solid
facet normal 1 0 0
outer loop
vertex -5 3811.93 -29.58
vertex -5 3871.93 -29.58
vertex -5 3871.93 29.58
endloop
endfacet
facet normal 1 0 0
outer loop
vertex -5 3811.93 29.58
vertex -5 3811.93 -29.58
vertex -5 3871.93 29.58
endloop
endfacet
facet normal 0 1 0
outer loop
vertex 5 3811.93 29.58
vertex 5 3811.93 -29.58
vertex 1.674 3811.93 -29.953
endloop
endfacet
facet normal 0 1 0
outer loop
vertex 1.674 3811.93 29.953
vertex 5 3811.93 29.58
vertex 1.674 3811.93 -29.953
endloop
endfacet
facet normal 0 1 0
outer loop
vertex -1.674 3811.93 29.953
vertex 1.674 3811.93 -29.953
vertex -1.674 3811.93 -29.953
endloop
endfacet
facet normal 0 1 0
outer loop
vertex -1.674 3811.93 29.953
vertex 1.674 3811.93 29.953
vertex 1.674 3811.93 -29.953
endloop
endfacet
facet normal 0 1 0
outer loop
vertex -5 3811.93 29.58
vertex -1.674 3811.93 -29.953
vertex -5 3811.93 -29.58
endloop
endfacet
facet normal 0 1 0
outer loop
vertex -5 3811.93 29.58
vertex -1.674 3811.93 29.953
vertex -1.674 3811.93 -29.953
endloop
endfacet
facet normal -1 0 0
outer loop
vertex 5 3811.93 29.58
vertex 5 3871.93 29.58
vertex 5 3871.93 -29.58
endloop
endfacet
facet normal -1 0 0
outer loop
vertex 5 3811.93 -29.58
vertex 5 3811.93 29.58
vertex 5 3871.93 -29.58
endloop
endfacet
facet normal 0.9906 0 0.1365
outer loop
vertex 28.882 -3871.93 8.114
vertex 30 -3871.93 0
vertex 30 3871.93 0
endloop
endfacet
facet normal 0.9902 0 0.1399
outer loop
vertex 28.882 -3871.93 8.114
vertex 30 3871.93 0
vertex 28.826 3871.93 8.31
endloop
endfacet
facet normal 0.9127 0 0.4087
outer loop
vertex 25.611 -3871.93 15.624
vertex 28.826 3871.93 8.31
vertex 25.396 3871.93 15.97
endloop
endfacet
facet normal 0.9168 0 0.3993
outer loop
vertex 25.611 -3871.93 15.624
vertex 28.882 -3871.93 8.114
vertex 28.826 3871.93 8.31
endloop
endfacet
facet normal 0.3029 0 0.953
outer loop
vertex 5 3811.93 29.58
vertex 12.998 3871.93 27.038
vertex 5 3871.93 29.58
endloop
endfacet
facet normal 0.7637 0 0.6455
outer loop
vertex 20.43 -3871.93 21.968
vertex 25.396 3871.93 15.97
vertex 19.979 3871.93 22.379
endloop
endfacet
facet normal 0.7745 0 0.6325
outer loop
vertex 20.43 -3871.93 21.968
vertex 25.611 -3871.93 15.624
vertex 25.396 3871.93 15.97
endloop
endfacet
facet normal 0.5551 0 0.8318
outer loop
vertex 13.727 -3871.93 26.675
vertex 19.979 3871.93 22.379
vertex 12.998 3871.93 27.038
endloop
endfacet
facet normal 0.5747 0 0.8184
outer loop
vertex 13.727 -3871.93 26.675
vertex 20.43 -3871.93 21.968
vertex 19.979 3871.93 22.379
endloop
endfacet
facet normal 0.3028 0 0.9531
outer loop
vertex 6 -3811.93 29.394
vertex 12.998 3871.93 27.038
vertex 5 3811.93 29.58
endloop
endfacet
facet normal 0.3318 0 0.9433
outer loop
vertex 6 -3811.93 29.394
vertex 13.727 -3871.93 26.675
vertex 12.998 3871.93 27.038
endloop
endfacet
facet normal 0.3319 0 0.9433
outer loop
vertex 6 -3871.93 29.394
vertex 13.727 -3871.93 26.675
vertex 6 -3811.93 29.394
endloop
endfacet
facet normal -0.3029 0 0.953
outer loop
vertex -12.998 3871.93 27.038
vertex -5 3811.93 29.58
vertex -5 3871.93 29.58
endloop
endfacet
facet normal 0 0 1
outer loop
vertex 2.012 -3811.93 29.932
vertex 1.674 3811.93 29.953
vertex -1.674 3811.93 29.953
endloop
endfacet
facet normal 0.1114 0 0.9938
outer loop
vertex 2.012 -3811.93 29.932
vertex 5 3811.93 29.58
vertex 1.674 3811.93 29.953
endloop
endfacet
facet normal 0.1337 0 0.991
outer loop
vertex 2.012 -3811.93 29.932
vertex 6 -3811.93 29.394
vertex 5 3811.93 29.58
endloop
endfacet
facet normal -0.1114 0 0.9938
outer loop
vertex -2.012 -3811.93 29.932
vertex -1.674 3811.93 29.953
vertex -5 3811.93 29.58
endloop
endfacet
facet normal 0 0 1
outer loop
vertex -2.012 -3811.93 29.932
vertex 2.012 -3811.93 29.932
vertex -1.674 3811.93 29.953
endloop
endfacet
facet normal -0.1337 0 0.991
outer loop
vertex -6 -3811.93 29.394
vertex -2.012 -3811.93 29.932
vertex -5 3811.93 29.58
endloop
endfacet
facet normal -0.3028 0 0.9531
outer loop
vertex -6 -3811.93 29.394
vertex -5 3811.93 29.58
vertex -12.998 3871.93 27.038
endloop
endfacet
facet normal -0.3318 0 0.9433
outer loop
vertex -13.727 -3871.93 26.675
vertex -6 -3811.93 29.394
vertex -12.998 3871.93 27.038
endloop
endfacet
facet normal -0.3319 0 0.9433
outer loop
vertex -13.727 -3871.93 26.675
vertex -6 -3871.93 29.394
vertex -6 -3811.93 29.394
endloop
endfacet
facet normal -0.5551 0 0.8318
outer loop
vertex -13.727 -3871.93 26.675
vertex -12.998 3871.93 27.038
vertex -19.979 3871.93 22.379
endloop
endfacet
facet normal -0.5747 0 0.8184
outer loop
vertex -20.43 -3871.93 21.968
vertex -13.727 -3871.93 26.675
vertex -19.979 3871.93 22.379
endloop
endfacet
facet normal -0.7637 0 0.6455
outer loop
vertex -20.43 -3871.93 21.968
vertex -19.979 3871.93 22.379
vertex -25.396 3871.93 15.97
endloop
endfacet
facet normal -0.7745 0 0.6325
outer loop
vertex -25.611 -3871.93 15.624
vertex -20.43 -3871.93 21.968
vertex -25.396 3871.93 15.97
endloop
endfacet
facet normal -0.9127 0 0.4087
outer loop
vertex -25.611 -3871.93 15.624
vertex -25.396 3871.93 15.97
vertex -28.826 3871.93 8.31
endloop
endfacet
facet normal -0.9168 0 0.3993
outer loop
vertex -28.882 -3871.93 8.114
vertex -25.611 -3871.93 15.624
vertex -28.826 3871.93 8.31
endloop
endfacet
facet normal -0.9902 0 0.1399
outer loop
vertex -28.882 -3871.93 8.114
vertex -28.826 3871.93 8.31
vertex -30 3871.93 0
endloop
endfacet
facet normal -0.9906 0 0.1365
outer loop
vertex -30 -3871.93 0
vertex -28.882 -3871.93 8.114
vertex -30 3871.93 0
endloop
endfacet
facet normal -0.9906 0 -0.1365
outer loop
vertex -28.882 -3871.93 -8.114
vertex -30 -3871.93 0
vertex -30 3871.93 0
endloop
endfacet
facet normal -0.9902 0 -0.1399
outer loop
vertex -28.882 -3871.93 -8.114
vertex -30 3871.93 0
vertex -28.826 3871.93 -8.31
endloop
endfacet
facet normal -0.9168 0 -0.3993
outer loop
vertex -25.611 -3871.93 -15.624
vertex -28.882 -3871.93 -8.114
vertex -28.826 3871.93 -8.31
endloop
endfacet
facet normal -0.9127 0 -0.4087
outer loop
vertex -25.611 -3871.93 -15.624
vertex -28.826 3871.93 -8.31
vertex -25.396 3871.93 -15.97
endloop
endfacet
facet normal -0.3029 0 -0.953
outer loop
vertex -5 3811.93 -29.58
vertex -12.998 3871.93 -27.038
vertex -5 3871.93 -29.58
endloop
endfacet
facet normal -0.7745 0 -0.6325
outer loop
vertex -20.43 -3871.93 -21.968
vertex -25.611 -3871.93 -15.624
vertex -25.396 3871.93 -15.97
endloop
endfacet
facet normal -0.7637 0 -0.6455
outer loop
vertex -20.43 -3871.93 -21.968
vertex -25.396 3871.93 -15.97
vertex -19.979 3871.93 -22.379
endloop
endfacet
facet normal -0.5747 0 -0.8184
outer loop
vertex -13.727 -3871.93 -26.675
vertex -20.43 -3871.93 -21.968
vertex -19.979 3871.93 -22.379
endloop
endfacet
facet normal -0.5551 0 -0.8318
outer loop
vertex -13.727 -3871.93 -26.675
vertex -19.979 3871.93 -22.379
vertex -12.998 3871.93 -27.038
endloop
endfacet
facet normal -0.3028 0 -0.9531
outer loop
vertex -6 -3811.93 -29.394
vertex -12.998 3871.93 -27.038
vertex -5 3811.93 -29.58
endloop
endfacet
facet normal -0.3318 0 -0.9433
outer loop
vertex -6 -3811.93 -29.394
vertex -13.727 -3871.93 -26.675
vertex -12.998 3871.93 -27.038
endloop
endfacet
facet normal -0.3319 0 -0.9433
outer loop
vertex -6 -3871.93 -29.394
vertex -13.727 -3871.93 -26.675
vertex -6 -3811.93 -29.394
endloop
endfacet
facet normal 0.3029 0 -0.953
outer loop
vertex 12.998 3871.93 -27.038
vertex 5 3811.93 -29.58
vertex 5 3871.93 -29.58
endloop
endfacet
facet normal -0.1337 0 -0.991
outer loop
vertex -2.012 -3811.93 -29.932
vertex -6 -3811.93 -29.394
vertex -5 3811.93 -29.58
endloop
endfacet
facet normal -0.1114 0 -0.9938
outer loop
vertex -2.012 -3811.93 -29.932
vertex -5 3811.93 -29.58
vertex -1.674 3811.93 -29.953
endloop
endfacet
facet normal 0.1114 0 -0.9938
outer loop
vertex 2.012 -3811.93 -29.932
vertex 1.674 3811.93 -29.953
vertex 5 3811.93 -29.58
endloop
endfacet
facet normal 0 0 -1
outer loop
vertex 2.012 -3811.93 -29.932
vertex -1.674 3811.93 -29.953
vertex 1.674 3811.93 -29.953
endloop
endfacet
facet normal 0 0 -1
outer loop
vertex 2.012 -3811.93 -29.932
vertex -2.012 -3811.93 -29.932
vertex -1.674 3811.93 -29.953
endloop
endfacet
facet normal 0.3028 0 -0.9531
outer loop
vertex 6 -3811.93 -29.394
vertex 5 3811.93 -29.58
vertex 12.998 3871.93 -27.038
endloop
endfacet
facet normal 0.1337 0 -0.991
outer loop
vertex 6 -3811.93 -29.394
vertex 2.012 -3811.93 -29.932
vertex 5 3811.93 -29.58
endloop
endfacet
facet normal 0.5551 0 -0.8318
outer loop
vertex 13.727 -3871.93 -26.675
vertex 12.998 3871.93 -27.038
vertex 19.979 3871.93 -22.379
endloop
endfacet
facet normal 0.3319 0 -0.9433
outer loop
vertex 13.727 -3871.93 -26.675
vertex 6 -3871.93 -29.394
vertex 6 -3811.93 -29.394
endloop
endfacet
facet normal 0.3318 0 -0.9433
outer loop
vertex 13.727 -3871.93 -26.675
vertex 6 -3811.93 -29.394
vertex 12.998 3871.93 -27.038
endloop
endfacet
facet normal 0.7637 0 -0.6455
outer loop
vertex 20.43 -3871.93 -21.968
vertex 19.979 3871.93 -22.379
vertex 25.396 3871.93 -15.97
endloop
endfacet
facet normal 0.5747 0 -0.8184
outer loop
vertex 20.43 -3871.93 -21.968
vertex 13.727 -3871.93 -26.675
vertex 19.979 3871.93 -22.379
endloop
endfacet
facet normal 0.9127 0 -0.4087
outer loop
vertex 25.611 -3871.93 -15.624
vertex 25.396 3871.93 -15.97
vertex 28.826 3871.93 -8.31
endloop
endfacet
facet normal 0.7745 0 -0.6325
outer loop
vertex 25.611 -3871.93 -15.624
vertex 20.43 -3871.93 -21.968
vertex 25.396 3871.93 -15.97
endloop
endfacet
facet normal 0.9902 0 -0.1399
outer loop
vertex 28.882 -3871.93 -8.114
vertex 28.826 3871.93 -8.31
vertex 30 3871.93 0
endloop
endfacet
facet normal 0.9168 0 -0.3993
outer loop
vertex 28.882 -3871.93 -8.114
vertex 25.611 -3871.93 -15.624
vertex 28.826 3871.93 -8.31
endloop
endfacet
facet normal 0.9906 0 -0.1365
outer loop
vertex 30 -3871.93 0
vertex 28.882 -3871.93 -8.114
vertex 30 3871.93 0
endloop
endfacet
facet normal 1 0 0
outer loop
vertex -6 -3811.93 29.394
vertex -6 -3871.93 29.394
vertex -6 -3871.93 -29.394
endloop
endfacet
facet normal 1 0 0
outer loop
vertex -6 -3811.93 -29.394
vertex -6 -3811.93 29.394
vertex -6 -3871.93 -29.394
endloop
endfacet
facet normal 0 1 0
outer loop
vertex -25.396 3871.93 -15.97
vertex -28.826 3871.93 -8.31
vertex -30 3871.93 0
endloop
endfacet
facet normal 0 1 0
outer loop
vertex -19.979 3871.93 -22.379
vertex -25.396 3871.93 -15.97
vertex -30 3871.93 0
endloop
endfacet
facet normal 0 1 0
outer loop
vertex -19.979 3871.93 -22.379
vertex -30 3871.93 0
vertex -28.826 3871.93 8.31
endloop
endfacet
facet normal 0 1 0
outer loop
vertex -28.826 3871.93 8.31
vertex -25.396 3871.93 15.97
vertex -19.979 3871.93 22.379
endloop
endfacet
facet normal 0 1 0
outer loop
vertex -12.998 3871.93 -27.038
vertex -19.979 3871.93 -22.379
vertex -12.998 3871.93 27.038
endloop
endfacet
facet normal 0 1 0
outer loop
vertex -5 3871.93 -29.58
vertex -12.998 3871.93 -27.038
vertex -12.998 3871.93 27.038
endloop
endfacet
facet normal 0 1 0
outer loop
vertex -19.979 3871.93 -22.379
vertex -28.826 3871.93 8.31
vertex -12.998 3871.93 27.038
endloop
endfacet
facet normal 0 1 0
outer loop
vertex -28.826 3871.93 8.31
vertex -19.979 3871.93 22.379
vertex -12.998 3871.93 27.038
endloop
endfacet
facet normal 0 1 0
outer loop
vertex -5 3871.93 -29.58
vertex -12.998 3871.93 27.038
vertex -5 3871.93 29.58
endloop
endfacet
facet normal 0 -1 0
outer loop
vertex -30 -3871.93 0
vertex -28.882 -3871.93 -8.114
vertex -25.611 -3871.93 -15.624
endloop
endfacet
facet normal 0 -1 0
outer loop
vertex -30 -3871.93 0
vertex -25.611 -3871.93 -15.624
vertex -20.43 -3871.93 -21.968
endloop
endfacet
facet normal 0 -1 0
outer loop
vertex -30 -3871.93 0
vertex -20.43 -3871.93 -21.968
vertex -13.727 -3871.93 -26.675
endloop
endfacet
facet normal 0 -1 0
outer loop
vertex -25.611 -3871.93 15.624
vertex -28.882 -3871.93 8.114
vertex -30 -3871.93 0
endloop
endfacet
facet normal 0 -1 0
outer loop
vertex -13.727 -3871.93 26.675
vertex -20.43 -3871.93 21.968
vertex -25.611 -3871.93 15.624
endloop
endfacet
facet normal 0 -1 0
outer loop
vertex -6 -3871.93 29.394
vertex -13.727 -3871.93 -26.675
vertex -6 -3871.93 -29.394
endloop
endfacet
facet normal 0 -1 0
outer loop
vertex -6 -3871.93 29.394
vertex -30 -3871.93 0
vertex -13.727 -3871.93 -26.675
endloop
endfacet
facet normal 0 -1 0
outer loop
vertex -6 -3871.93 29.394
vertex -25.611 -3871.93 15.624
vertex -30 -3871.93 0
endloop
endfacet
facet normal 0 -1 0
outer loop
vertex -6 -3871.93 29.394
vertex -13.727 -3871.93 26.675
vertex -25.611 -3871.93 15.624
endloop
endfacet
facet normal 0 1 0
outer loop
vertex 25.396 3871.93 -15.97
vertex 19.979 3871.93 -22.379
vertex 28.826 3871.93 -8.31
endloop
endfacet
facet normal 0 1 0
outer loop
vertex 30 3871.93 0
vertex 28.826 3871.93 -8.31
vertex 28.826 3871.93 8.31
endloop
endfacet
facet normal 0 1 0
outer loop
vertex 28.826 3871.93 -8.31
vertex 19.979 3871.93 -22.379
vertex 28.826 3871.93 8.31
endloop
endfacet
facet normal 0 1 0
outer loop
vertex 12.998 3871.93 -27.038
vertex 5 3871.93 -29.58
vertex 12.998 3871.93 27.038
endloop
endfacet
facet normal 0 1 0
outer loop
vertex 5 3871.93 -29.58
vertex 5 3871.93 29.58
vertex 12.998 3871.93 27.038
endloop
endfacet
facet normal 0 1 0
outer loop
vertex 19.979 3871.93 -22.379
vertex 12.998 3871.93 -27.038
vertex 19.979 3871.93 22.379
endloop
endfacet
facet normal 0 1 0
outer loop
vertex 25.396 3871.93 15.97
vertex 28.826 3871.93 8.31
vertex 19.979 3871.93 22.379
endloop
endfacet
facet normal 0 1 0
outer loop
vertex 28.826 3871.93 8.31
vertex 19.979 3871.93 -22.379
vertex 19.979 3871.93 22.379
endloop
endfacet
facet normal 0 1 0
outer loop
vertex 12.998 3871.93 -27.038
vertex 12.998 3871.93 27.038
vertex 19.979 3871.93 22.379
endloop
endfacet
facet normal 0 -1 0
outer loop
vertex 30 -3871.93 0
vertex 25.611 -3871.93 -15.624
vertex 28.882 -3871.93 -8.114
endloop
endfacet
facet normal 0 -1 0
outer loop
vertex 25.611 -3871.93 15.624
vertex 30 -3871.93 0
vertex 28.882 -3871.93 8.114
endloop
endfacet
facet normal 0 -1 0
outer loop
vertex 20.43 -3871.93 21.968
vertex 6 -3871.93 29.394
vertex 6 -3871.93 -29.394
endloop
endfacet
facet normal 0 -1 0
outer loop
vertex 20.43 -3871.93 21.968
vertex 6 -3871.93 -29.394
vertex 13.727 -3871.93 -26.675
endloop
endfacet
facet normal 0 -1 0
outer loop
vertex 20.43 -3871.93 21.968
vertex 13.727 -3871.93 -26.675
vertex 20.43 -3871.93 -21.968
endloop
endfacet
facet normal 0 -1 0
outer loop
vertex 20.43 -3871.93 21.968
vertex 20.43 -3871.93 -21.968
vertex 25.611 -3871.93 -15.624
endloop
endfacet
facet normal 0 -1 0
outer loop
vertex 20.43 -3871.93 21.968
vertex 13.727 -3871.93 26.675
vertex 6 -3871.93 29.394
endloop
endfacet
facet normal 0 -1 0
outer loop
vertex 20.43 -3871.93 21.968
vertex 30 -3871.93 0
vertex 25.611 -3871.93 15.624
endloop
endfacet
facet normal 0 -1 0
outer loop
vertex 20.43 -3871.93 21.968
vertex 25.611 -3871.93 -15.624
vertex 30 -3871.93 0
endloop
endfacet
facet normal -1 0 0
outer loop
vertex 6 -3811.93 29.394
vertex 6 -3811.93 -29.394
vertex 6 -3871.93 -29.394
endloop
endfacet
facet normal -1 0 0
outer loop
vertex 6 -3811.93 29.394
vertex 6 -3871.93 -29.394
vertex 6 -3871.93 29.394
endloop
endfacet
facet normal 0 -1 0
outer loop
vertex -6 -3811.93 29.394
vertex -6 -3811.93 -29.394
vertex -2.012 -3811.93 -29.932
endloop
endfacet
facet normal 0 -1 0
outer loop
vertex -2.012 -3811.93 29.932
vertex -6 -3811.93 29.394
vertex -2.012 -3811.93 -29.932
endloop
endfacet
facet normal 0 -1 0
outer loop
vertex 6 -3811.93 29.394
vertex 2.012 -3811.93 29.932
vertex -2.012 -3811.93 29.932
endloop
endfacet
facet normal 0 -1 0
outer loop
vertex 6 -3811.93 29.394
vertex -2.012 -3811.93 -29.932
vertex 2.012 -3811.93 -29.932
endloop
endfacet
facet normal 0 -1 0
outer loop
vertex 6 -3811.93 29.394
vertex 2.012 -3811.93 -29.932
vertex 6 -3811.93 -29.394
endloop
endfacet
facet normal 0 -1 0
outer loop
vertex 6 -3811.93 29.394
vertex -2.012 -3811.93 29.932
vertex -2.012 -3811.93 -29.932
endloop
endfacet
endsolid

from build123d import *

# Parameters (mm, degrees)
F0_R     = 30
F1_DEPTH = 3871.93
F3_DEPTH = 60
F5_DEPTH = 60


with BuildPart() as f1:
    # F0 (on Front) → F1 (new body, symmetric)
    with BuildSketch(Plane.XZ):
        Circle(F0_R)
    extrude(amount=F1_DEPTH, both=True)

    # F2 (on face) → F3 (cut)
    with BuildSketch(Plane.XZ.offset(3871.93)):
        with BuildLine():
            Line((6, 29.3938769134), (6, 92.5506760976))
            Line((6, 92.5506760976), (-6, 92.5506760976))
            Line((-6, 92.5506760976), (-6, 29.3938769134))
            ThreePointArc((-6, 29.3938769134), (0, 30), (6, 29.3938769134))
        make_face()
        with BuildLine():
            Line((6, -29.3938769134), (6, 29.3938769134))
            ThreePointArc((6, 29.3938769134), (0, 30), (-6, 29.3938769134))
            Line((-6, 29.3938769134), (-6, -29.3938769134))
            ThreePointArc((-6, -29.3938769134), (0, -30), (6, -29.3938769134))
        make_face()
    extrude(amount=-F3_DEPTH, mode=Mode.SUBTRACT)

    # F4 (on face) → F5 (cut)
    with BuildSketch(Plane(origin=(0, 3871.93, 0), x_dir=(-1, 0, 0), z_dir=(0, 1, 0))):
        with BuildLine():
            Line((5, -29.5803989155), (5, 29.5803989155))
            ThreePointArc((5, 29.5803989155), (0, 30), (-5, 29.5803989155))
            Line((-5, 29.5803989155), (-5, -29.5803989155))
            ThreePointArc((-5, -29.5803989155), (0, -30), (5, -29.5803989155))
        make_face()
    extrude(amount=-F5_DEPTH, mode=Mode.SUBTRACT)


solid = f1.part
